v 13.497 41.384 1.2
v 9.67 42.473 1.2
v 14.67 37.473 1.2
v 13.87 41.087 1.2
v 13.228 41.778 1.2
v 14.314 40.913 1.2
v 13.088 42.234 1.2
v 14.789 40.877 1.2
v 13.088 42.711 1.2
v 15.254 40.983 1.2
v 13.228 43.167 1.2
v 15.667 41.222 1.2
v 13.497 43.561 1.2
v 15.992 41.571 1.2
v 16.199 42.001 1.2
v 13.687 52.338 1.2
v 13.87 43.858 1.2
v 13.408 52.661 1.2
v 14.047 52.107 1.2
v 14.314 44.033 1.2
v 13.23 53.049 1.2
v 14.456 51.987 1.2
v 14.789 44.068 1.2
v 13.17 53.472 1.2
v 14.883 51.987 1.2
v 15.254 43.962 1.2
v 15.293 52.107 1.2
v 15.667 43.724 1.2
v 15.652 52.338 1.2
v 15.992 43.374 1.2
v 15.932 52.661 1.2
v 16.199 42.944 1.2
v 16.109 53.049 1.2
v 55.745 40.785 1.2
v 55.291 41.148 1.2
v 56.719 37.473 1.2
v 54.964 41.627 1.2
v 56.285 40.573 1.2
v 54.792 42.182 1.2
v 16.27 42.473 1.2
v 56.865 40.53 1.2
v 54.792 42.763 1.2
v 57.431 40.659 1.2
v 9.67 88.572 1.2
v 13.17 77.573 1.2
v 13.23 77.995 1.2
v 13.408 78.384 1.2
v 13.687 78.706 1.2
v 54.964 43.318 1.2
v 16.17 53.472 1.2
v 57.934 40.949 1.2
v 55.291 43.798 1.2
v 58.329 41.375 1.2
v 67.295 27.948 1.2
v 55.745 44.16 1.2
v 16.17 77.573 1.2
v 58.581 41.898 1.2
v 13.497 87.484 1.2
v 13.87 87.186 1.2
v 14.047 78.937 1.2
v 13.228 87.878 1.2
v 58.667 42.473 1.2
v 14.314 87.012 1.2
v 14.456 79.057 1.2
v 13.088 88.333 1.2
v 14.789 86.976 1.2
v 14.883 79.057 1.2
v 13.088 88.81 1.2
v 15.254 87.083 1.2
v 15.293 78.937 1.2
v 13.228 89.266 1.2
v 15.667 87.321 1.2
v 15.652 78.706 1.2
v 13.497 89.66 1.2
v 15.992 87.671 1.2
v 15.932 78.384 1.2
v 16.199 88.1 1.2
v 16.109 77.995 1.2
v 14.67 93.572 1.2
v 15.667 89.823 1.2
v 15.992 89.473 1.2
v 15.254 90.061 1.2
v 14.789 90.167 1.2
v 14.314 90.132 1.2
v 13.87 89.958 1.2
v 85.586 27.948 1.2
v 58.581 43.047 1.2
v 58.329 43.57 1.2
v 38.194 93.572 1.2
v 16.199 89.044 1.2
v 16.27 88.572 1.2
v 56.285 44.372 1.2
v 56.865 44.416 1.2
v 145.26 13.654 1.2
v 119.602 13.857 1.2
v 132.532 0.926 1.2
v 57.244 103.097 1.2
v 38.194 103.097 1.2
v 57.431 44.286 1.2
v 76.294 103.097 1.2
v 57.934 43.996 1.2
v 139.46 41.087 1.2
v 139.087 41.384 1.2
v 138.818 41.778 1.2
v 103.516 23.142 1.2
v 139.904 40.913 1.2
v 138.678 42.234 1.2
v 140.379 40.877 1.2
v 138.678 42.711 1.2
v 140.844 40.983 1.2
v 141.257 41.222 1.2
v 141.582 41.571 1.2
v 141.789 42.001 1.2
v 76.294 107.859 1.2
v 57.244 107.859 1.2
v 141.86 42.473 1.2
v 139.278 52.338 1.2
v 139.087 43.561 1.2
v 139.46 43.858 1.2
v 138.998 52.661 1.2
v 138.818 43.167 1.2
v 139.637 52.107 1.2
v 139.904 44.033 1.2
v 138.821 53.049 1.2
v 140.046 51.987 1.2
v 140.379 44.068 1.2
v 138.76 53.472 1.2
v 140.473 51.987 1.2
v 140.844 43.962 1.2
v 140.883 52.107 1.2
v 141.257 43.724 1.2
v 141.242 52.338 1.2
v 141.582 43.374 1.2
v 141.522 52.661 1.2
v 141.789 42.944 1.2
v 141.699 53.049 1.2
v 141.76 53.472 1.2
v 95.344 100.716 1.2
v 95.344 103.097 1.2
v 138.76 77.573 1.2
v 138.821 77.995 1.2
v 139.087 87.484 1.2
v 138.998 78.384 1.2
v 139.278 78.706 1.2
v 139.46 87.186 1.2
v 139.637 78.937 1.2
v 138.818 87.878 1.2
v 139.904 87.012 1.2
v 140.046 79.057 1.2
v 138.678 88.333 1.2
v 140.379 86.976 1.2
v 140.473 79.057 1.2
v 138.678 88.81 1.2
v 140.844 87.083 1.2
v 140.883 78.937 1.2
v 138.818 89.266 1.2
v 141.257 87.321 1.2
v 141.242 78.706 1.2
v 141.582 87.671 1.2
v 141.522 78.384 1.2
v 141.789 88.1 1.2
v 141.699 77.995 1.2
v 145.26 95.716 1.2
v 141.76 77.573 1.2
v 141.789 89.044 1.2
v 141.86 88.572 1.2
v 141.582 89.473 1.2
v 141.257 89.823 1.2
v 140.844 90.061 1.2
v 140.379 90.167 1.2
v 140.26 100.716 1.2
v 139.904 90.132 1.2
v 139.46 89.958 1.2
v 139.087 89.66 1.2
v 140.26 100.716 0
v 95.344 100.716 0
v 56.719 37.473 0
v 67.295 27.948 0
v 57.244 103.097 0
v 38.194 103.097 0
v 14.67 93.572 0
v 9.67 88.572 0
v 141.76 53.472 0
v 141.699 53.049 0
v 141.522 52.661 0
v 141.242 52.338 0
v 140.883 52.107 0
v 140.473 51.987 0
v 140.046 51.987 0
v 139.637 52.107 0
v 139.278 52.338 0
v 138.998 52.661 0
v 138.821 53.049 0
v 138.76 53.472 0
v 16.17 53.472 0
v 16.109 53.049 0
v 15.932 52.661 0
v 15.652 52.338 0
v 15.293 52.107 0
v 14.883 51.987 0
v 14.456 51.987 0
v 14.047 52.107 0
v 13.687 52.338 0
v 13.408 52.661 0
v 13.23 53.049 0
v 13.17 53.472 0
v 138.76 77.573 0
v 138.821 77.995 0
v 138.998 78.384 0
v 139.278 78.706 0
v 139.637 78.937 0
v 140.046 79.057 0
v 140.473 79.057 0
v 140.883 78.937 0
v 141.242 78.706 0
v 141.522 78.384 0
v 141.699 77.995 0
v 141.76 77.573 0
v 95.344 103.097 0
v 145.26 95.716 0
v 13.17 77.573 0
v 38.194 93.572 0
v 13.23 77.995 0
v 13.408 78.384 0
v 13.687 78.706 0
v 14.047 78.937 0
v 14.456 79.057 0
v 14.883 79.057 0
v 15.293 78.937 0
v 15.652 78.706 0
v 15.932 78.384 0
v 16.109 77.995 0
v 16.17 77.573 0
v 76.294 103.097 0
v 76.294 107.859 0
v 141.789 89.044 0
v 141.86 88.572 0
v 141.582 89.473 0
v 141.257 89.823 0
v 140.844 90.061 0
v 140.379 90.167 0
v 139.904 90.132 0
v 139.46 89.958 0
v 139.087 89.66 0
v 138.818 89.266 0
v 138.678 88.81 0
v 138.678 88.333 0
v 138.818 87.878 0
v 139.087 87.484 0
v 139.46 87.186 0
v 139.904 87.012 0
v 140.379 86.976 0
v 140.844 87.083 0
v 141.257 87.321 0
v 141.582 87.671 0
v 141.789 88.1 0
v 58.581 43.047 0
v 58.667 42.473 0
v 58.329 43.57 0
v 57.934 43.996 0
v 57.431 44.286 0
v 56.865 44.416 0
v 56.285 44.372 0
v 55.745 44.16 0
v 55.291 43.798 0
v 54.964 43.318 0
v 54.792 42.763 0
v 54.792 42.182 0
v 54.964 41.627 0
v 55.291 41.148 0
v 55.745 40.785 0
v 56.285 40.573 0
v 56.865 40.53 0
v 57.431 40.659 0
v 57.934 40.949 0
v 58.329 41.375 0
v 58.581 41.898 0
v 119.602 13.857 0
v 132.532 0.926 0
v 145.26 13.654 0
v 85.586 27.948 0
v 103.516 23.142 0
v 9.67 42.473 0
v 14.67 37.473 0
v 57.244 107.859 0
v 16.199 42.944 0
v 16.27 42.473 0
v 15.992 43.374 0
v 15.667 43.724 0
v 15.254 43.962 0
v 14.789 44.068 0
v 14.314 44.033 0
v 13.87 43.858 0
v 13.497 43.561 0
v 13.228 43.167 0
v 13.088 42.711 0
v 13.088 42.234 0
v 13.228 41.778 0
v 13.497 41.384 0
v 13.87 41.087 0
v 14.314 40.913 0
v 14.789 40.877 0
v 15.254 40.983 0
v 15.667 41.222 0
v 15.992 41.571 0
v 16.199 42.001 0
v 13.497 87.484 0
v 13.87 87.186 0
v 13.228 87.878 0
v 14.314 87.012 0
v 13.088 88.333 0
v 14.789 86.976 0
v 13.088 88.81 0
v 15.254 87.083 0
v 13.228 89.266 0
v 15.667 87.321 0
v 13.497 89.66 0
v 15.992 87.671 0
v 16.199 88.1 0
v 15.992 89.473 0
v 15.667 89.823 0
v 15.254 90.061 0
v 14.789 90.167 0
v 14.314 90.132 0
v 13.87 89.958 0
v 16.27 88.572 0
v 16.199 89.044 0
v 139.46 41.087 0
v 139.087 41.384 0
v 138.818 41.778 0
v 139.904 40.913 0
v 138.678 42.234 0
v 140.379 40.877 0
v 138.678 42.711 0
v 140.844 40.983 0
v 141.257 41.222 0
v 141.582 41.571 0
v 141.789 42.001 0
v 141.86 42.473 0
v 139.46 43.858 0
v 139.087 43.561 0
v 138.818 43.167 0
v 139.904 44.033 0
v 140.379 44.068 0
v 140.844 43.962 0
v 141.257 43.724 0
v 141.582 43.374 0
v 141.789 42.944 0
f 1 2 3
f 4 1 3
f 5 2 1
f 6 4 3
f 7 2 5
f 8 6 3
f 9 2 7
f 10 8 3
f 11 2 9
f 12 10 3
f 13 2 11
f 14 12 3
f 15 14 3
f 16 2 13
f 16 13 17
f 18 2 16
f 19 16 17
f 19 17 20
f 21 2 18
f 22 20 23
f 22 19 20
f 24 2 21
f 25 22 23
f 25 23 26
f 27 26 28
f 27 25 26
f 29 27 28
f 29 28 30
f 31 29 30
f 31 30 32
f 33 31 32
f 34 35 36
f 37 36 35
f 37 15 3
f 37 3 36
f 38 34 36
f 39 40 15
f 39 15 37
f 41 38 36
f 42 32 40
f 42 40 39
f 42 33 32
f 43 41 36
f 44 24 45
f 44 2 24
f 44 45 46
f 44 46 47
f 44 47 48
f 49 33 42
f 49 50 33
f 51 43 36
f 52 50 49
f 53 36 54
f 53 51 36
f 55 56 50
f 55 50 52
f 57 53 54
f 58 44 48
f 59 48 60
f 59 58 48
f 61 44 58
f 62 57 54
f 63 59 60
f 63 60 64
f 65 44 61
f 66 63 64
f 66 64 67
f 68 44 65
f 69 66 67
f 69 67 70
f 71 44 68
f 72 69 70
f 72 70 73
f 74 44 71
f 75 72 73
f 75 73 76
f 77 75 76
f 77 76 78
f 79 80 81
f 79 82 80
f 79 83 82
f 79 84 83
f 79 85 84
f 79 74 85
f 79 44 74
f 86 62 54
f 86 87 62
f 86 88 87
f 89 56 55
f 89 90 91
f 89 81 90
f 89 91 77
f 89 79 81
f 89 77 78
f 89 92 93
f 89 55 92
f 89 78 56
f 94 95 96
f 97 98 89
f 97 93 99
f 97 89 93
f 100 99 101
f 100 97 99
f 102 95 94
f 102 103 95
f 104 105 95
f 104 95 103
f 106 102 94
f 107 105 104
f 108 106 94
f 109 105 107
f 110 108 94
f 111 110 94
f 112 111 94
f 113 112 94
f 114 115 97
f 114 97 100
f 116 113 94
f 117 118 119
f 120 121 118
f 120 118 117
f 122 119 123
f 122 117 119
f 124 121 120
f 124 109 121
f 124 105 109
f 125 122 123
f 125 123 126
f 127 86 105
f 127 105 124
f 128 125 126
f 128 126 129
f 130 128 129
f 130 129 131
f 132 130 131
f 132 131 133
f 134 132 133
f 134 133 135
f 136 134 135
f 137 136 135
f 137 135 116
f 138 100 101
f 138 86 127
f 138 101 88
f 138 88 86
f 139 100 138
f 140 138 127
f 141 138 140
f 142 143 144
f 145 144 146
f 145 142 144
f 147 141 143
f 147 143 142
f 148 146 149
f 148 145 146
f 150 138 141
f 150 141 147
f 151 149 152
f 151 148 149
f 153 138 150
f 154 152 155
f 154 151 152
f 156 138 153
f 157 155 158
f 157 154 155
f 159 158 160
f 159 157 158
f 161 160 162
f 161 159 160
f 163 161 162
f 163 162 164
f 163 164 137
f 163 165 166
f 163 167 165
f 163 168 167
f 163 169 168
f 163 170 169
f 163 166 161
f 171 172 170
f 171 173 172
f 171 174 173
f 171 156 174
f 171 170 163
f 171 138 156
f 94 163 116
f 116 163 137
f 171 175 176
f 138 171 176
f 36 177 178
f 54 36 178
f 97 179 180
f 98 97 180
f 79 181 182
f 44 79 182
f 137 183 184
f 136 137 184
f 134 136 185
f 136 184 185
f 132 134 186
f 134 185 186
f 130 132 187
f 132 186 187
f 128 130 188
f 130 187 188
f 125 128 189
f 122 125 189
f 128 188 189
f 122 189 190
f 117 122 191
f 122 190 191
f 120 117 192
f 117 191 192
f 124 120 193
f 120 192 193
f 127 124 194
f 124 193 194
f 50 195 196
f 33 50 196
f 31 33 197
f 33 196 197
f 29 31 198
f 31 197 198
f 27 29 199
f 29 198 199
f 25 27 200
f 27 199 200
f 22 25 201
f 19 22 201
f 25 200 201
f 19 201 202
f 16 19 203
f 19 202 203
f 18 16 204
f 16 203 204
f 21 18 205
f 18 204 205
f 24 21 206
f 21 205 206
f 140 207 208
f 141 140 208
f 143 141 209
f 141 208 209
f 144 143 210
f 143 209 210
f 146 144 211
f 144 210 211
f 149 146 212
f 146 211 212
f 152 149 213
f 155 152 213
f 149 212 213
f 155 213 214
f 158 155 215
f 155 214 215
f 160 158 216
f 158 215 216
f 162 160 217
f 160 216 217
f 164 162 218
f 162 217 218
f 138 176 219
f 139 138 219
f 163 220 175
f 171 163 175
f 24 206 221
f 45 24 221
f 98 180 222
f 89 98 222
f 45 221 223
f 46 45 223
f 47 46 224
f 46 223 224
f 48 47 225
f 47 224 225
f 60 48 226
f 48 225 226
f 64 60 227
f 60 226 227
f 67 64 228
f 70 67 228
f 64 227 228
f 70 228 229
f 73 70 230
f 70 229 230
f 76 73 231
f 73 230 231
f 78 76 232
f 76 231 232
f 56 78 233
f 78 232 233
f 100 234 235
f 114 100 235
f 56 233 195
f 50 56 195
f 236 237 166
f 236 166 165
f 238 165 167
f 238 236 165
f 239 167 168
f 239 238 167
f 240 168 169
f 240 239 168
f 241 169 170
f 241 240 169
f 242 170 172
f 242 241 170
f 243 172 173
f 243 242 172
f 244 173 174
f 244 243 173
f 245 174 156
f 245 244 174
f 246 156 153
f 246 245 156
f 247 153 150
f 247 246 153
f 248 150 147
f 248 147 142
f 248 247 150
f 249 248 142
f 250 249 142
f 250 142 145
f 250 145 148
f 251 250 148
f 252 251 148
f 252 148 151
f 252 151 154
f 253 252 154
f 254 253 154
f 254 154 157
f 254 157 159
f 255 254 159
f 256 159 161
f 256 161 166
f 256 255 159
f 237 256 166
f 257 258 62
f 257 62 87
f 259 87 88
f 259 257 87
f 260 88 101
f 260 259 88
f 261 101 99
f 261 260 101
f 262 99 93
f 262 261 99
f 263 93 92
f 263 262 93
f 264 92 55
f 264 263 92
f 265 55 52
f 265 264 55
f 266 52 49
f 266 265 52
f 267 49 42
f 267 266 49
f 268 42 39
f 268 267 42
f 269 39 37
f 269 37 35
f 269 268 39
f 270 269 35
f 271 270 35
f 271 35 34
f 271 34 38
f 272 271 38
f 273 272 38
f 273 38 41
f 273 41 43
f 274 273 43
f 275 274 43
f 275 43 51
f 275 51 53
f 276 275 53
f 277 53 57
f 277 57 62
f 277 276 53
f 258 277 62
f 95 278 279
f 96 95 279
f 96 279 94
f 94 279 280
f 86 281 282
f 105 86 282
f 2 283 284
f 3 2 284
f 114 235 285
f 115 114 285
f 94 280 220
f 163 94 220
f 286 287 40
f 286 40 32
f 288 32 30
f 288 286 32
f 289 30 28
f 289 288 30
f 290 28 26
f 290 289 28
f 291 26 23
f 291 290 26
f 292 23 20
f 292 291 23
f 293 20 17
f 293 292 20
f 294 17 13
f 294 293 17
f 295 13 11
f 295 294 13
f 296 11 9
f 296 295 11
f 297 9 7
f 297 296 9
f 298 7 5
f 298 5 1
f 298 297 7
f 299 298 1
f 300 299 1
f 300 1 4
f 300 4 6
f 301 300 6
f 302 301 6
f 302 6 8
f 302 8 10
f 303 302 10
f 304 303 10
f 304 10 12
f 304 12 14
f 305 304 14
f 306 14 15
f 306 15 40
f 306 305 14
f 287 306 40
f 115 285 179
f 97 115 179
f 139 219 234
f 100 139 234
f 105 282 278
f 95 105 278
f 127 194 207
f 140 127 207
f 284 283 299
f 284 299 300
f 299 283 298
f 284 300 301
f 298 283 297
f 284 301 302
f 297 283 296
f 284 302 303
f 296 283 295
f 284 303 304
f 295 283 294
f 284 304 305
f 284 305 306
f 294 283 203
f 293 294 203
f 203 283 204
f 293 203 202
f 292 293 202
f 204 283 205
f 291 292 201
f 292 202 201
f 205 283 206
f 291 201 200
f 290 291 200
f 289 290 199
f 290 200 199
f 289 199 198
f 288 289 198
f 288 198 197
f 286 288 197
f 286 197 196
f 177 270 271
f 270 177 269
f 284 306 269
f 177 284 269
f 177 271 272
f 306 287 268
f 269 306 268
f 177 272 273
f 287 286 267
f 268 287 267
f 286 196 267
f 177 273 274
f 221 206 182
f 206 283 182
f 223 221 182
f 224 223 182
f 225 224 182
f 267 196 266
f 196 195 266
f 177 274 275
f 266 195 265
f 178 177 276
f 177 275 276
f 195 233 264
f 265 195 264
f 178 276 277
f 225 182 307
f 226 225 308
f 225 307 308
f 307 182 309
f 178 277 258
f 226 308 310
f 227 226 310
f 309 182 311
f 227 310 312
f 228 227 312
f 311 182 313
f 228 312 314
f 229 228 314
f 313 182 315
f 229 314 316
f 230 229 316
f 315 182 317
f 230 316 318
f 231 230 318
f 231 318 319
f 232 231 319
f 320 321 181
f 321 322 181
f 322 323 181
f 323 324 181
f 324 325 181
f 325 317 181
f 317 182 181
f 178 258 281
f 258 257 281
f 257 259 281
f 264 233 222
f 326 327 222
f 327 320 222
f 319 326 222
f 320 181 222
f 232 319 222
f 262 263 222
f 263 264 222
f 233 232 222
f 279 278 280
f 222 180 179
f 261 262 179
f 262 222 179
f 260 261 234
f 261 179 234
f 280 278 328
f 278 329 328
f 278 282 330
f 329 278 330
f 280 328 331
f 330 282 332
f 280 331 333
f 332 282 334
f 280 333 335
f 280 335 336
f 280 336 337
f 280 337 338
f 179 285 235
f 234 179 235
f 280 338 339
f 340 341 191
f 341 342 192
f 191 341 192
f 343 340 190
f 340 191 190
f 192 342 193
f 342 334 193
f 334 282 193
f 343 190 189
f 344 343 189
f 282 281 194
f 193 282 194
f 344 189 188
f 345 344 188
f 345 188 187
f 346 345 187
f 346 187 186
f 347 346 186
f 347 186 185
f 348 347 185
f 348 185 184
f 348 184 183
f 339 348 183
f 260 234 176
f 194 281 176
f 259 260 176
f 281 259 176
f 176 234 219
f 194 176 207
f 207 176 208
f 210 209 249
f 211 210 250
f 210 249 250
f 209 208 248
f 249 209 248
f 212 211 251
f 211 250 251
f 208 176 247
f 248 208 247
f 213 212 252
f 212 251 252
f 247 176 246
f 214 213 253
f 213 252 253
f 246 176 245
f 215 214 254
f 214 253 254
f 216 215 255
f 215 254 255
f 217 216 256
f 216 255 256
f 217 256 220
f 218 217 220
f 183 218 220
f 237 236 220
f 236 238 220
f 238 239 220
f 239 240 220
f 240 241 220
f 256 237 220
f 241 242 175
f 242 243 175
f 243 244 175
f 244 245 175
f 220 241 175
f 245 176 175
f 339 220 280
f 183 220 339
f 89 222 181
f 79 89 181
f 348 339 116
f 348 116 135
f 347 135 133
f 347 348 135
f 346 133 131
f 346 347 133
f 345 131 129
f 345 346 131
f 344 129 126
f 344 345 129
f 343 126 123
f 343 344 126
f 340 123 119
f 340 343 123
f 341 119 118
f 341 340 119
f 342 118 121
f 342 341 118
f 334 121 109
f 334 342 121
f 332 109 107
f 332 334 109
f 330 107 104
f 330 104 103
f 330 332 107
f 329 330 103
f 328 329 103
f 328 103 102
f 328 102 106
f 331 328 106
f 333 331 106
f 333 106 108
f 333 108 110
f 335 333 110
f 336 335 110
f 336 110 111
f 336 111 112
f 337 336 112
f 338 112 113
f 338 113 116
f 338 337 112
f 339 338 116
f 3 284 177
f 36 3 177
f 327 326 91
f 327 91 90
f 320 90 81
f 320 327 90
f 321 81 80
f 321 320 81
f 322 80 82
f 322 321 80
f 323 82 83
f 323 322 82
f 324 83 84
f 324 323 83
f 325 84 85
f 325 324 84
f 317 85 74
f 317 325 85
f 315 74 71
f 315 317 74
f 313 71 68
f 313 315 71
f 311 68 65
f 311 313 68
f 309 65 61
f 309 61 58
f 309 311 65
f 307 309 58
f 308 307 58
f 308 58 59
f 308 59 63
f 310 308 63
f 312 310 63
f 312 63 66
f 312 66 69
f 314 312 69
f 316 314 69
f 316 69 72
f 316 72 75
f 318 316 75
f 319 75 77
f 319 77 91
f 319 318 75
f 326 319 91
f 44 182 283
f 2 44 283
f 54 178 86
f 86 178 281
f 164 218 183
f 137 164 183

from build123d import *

# Parameters (mm, degrees)
ESQUISSE2_R        = 1.6
ESQUISSE2_R_2      = 1.948326961
BOSS_EXTRU_1_DEPTH = 1.2


with BuildPart() as part:
    # Esquisse2 → Boss.-Extru.1 (new body)
    with BuildSketch(Plane.XY):
        Polygon((38.19435, 93.5719), (14.6697, 93.5719), (9.6697, 88.5719), (9.6697, 42.4727), (14.6697, 37.4727), (56.719, 37.4727), (67.2947, 27.9475), (85.586462681, 27.9475), (103.516430018, 23.142256556), (119.601627139, 13.856517967), (132.532309311, 0.926057837), (145.259827189, 13.653794272), (145.259827189, 95.7157), (140.259827189, 100.7157), (95.34435, 100.7157), (95.34435, 103.097), (76.29435, 103.097), (76.29435, 107.859), (57.24435, 107.859), (57.24435, 103.097), (38.19435, 103.097), align=None)
        with Locations((14.6697, 42.4727)):
            Circle(ESQUISSE2_R, mode=Mode.SUBTRACT)
        with Locations((14.6697, 88.5719)):
            Circle(ESQUISSE2_R, mode=Mode.SUBTRACT)
        with Locations((140.259827189, 88.5719)):
            Circle(ESQUISSE2_R, mode=Mode.SUBTRACT)
        with Locations((140.259827189, 42.4727)):
            Circle(ESQUISSE2_R, mode=Mode.SUBTRACT)
        with Locations((56.719, 42.4727)):
            Circle(ESQUISSE2_R_2, mode=Mode.SUBTRACT)
        with BuildLine():
            Line((16.1697, 77.5727), (16.1697, 53.4719))
            ThreePointArc((16.1697, 53.4719), (14.6697, 51.9719), (13.1697, 53.4719))
            Line((13.1697, 53.4719), (13.1697, 77.5727))
            ThreePointArc((13.1697, 77.5727), (14.6697, 79.0727), (16.1697, 77.5727))
        make_face(mode=Mode.SUBTRACT)
        with BuildLine():
            Line((141.759827189, 77.5727), (141.759827189, 53.4719))
            ThreePointArc((141.759827189, 53.4719), (140.259827189, 51.9719), (138.759827189, 53.4719))
            Line((138.759827189, 53.4719), (138.759827189, 77.5727))
            ThreePointArc((138.759827189, 77.5727), (140.259827189, 79.0727), (141.759827189, 77.5727))
        make_face(mode=Mode.SUBTRACT)
    extrude(amount=BOSS_EXTRU_1_DEPTH)


solid = part.part
